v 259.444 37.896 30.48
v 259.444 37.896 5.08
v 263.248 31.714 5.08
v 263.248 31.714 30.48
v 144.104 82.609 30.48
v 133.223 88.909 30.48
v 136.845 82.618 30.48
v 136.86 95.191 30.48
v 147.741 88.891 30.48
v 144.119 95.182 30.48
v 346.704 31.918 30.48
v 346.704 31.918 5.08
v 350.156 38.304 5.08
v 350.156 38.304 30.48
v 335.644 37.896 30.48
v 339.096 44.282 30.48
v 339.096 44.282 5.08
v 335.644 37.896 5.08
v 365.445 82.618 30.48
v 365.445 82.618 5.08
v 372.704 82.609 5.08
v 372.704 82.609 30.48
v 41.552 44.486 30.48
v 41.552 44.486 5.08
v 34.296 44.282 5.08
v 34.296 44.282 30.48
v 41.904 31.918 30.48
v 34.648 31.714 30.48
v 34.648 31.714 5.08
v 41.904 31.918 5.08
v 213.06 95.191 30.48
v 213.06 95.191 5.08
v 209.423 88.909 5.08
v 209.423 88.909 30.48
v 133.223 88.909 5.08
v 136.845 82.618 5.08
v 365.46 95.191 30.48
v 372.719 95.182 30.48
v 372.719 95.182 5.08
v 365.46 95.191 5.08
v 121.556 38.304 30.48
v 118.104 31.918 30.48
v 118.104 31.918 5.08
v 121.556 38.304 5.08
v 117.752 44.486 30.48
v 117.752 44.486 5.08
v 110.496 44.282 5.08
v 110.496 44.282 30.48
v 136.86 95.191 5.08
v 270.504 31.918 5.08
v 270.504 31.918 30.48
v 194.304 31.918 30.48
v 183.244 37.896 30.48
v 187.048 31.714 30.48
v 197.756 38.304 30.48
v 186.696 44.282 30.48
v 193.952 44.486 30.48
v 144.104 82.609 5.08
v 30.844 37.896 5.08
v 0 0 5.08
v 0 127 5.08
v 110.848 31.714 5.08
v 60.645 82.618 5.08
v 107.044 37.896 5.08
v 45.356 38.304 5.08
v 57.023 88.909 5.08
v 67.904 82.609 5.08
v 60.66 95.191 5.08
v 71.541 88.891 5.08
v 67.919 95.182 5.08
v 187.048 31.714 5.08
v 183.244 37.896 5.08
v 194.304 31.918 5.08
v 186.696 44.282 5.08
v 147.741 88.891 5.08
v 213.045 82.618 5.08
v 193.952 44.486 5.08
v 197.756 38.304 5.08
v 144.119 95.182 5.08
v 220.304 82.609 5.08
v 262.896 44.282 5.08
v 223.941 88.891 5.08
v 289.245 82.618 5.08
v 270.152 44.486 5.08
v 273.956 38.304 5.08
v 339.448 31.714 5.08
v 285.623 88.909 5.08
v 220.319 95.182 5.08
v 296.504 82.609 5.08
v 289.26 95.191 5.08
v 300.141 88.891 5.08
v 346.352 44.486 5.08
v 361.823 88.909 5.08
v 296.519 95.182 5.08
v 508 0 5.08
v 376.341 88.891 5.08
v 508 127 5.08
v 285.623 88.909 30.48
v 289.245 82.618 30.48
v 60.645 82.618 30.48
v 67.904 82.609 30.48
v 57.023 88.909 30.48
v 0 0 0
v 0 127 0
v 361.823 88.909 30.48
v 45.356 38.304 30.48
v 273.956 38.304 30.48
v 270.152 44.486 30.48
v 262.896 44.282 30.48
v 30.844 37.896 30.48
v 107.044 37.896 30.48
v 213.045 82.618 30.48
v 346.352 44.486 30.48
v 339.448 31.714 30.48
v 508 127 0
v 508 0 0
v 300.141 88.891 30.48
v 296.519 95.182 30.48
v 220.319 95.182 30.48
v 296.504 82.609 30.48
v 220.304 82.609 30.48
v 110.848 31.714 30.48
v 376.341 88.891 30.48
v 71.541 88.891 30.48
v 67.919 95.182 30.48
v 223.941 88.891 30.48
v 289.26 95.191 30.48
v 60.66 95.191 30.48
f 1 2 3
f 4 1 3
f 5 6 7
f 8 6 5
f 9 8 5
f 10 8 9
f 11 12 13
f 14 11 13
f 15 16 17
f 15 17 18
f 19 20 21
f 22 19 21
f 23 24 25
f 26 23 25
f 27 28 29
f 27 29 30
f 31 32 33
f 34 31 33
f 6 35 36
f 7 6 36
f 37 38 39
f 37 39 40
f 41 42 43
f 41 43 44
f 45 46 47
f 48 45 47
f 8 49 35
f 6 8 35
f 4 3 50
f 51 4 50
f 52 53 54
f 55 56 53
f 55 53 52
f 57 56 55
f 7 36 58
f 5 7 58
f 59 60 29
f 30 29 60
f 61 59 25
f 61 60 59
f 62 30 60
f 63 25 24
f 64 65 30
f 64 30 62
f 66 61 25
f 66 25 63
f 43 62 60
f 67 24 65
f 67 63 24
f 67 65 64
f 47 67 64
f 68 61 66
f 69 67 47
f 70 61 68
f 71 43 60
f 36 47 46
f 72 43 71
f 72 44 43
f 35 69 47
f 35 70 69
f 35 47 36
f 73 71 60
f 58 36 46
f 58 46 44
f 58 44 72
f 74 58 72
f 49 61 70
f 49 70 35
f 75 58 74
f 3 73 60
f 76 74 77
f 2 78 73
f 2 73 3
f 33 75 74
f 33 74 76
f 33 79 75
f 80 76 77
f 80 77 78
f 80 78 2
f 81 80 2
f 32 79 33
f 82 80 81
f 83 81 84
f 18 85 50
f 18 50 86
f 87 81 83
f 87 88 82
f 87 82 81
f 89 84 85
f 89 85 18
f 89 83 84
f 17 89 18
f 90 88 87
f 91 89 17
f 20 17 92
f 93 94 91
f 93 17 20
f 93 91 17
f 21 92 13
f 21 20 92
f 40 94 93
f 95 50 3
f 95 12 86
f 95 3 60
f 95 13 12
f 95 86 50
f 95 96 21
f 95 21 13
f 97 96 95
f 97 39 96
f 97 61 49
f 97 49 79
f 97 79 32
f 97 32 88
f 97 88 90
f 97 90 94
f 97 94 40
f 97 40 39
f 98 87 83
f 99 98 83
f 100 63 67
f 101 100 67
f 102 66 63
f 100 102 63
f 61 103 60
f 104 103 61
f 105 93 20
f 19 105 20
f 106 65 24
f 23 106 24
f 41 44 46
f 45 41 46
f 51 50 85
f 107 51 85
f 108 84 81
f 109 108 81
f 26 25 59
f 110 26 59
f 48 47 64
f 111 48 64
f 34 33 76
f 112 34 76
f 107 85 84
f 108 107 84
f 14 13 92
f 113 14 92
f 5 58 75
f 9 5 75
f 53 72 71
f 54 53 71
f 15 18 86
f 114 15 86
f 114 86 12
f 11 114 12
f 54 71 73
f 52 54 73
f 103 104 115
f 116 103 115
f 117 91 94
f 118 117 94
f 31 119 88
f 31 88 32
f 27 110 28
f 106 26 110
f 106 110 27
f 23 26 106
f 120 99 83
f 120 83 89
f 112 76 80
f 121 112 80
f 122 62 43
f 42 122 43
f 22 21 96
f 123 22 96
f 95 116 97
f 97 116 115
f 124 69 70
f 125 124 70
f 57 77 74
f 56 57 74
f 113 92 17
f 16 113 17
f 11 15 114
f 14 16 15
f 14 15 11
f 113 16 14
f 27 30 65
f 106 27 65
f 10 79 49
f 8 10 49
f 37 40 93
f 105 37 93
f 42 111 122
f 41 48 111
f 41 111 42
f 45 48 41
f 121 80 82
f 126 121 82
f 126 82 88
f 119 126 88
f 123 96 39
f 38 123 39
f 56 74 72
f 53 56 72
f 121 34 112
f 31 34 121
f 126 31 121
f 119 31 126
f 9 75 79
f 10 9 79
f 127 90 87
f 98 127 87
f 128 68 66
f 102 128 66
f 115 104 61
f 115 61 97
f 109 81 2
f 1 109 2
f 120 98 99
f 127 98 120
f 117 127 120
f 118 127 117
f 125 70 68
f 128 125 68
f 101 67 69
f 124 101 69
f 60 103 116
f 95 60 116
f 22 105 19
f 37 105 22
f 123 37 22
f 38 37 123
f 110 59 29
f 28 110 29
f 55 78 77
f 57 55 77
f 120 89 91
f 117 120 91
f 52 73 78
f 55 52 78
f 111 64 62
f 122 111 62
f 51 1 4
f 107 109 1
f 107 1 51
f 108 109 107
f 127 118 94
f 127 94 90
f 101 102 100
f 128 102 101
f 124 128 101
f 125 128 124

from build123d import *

# Parameters (mm, degrees)
F0_W     = 508
F0_H     = 127
F1_DEPTH = 5.08
F3_DEPTH = 25.4


with BuildPart() as f1:
    # F0 (on Top) → F1 (new body)
    with BuildSketch(Plane.XY):
        with Locations((254, 63.5)):
            Rectangle(F0_W, F0_H)
    extrude(amount=F1_DEPTH)

    # F2 (on face) → F3 (join)
    with BuildSketch(Plane.XY.offset(5.08)):
        Polygon((45.356168, 38.303634), (41.551732, 44.485843), (34.295564, 44.282209), (30.843832, 37.896366), (34.648268, 31.714157), (41.904436, 31.917791), align=None)
        Polygon((67.903701, 82.609158), (71.54074, 88.891306), (67.91876, 95.182149), (60.65974, 95.190842), (57.022701, 88.908694), (60.644682, 82.617851), align=None)
        Polygon((144.11876, 95.182149), (136.85974, 95.190842), (133.222701, 88.908694), (136.844682, 82.617851), (144.103701, 82.609158), (147.74074, 88.891306), align=None)
        Polygon((110.848268, 31.714157), (118.104436, 31.917791), (121.556168, 38.303634), (117.751732, 44.485843), (110.495564, 44.282209), (107.043832, 37.896366), align=None)
        Polygon((220.31876, 95.182149), (213.05974, 95.190842), (209.422701, 88.908694), (213.044682, 82.617851), (220.303701, 82.609158), (223.94074, 88.891306), align=None)
        Polygon((187.048268, 31.714157), (194.304436, 31.917791), (197.756168, 38.303634), (193.951732, 44.485843), (186.695564, 44.282209), (183.243832, 37.896366), align=None)
        Polygon((296.51876, 95.182149), (289.25974, 95.190842), (285.622701, 88.908694), (289.244682, 82.617851), (296.503701, 82.609158), (300.14074, 88.891306), align=None)
        Polygon((263.248268, 31.714157), (270.504436, 31.917791), (273.956168, 38.303634), (270.151732, 44.485843), (262.895564, 44.282209), (259.443832, 37.896366), align=None)
        Polygon((372.71876, 95.182149), (365.45974, 95.190842), (361.822701, 88.908694), (365.444682, 82.617851), (372.703701, 82.609158), (376.34074, 88.891306), align=None)
        Polygon((339.448268, 31.714157), (346.704436, 31.917791), (350.156168, 38.303634), (346.351732, 44.485843), (339.095564, 44.282209), (335.643832, 37.896366), align=None)
    extrude(amount=F3_DEPTH)


solid = f1.part
